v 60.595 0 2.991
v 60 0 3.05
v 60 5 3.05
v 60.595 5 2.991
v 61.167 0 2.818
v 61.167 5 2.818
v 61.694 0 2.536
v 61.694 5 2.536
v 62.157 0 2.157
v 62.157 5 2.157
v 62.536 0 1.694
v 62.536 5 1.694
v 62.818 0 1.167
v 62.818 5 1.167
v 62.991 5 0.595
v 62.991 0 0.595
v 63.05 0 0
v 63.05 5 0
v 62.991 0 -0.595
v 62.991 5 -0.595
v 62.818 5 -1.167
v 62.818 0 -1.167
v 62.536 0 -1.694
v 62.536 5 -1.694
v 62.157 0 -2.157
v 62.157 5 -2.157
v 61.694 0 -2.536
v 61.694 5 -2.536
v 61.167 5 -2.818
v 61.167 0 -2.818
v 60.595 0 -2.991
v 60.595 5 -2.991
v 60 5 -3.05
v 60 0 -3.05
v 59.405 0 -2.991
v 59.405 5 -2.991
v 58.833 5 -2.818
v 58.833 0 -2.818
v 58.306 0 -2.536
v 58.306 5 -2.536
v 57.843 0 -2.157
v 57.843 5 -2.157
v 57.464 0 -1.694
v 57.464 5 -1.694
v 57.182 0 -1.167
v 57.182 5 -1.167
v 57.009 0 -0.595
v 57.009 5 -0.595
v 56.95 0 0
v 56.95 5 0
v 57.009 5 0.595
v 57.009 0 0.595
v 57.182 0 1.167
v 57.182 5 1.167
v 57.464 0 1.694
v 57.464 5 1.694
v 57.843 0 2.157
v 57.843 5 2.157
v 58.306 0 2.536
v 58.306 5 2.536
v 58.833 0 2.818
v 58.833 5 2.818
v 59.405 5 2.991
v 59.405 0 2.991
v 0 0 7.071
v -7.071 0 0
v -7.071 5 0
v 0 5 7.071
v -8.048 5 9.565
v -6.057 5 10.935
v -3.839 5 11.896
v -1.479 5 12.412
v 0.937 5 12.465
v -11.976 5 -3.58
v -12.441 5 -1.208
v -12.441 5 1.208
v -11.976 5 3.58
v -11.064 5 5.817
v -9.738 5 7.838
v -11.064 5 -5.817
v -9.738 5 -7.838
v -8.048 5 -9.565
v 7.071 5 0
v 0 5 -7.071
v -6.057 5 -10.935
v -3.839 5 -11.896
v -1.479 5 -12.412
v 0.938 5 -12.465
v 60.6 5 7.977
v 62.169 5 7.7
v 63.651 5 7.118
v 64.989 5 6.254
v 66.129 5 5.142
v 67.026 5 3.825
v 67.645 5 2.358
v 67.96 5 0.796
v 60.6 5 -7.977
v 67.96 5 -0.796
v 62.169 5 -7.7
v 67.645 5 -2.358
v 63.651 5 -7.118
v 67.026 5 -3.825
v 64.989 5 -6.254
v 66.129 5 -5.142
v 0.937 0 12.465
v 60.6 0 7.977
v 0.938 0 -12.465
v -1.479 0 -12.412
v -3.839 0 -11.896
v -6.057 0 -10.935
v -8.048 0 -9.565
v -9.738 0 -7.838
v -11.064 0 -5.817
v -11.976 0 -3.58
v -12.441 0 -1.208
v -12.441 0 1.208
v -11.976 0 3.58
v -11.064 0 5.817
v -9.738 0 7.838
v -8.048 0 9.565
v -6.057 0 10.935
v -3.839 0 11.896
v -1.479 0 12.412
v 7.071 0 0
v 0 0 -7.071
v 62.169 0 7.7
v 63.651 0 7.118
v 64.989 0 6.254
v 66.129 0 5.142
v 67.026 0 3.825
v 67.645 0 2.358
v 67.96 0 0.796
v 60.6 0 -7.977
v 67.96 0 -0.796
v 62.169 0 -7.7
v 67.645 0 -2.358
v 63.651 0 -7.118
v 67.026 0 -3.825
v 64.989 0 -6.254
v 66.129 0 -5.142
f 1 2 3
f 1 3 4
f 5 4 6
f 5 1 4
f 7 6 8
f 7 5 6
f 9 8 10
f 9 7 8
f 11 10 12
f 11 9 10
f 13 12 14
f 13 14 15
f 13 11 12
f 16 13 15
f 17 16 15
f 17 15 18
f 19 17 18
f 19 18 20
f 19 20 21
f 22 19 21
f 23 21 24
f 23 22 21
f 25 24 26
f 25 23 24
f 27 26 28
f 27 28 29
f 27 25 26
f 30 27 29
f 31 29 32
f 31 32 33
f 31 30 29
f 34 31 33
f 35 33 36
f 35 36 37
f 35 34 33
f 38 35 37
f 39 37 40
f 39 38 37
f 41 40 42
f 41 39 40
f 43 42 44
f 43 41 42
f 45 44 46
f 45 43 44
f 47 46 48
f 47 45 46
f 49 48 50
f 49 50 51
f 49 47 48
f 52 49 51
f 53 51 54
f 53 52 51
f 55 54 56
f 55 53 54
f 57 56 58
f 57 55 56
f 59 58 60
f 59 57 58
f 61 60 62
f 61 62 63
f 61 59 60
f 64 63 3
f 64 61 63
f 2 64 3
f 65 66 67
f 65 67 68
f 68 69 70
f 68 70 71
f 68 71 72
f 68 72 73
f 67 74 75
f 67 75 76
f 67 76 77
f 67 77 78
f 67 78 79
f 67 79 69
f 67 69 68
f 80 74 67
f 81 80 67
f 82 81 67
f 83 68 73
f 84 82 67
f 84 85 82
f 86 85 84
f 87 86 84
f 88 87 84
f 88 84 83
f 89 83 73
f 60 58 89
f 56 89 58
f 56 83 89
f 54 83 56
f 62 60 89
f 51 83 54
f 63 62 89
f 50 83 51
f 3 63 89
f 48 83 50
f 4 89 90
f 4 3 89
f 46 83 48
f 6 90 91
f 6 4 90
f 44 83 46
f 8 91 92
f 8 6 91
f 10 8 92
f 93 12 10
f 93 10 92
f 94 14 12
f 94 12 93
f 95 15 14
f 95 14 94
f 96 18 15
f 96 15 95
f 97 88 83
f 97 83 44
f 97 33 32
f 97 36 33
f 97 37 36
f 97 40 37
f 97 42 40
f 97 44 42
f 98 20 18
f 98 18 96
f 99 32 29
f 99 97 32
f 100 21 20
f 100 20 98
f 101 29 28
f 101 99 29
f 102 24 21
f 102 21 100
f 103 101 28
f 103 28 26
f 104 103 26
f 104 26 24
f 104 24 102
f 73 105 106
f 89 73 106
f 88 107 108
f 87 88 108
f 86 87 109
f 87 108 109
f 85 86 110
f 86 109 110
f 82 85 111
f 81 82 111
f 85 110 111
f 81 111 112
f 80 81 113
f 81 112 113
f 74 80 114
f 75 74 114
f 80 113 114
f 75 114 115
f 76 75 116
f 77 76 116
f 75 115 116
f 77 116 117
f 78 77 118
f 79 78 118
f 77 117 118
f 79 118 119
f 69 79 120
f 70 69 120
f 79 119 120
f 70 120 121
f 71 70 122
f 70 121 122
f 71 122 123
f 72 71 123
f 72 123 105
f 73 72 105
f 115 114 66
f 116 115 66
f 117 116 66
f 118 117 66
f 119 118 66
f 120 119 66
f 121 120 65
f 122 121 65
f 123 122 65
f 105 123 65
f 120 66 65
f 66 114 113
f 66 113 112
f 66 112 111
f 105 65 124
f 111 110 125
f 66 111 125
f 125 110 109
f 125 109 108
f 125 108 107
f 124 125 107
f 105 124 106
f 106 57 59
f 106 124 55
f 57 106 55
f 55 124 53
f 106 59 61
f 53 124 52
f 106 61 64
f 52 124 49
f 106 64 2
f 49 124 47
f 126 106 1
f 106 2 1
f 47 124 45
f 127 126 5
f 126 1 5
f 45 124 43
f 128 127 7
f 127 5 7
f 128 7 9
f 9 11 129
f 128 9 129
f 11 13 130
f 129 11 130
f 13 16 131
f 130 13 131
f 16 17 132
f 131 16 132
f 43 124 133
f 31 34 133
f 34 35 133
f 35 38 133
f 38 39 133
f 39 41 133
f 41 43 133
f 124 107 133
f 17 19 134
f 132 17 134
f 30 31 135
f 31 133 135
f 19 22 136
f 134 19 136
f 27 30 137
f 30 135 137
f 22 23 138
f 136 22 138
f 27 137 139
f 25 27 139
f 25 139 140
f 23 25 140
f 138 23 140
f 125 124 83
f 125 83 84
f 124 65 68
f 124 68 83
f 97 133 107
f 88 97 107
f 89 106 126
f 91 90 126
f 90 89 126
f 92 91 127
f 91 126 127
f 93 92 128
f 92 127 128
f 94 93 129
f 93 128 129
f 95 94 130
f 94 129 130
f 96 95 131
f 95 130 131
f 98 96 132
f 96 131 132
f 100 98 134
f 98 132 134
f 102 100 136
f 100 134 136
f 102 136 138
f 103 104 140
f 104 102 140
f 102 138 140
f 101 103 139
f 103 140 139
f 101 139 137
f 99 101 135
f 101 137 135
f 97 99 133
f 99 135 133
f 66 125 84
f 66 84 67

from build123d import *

# Parameters (mm, degrees)
SKETCH_1_R      = 12.5
SKETCH_1_R_2    = 8
SKETCH_1_R_3    = 3.05
EXTRUDE_1_DEPTH = 5


with BuildPart() as part:
    # 草图1 → 凸台-拉伸1 (new body)
    # profile 1 of 3: a face of its own
    with BuildSketch(Plane(origin=(0, 0, 0), x_dir=(1, 0, 0), z_dir=(0, 1, 0))):
        with BuildLine():
            ThreePointArc((12.5, 0), (9.164298937, -8.500919068), (0.9375, -12.464794172))
            Line((0.9375, -12.464794172), (60.6, -7.97746827))
            ThreePointArc((60.6, -7.97746827), (52, 0), (60.6, 7.97746827))
            Line((60.6, 7.97746827), (0.9375, 12.464794172))
            ThreePointArc((0.9375, 12.464794172), (9.164298937, 8.500919068), (12.5, 0))
        make_face()
    # profile 2 of 3: a face of its own
    with BuildSketch(Plane(origin=(0, 0, 0), x_dir=(1, 0, 0), z_dir=(0, 1, 0))):
        Circle(SKETCH_1_R)
        Polygon((0, -7.071067812), (7.071067812, 0), (0, 7.071067812), (-7.071067812, 0), align=None, mode=Mode.SUBTRACT)
    # profile 3 of 3: a face of its own
    with BuildSketch(Plane(origin=(0, 0, 0), x_dir=(1, 0, 0), z_dir=(0, 1, 0))):
        with Locations((60, 0)):
            Circle(SKETCH_1_R_2)
        with Locations(Location((60, 0, 0), (0, 0, 270))):
            Circle(SKETCH_1_R_3, mode=Mode.SUBTRACT)
    extrude(amount=EXTRUDE_1_DEPTH)


solid = part.part
